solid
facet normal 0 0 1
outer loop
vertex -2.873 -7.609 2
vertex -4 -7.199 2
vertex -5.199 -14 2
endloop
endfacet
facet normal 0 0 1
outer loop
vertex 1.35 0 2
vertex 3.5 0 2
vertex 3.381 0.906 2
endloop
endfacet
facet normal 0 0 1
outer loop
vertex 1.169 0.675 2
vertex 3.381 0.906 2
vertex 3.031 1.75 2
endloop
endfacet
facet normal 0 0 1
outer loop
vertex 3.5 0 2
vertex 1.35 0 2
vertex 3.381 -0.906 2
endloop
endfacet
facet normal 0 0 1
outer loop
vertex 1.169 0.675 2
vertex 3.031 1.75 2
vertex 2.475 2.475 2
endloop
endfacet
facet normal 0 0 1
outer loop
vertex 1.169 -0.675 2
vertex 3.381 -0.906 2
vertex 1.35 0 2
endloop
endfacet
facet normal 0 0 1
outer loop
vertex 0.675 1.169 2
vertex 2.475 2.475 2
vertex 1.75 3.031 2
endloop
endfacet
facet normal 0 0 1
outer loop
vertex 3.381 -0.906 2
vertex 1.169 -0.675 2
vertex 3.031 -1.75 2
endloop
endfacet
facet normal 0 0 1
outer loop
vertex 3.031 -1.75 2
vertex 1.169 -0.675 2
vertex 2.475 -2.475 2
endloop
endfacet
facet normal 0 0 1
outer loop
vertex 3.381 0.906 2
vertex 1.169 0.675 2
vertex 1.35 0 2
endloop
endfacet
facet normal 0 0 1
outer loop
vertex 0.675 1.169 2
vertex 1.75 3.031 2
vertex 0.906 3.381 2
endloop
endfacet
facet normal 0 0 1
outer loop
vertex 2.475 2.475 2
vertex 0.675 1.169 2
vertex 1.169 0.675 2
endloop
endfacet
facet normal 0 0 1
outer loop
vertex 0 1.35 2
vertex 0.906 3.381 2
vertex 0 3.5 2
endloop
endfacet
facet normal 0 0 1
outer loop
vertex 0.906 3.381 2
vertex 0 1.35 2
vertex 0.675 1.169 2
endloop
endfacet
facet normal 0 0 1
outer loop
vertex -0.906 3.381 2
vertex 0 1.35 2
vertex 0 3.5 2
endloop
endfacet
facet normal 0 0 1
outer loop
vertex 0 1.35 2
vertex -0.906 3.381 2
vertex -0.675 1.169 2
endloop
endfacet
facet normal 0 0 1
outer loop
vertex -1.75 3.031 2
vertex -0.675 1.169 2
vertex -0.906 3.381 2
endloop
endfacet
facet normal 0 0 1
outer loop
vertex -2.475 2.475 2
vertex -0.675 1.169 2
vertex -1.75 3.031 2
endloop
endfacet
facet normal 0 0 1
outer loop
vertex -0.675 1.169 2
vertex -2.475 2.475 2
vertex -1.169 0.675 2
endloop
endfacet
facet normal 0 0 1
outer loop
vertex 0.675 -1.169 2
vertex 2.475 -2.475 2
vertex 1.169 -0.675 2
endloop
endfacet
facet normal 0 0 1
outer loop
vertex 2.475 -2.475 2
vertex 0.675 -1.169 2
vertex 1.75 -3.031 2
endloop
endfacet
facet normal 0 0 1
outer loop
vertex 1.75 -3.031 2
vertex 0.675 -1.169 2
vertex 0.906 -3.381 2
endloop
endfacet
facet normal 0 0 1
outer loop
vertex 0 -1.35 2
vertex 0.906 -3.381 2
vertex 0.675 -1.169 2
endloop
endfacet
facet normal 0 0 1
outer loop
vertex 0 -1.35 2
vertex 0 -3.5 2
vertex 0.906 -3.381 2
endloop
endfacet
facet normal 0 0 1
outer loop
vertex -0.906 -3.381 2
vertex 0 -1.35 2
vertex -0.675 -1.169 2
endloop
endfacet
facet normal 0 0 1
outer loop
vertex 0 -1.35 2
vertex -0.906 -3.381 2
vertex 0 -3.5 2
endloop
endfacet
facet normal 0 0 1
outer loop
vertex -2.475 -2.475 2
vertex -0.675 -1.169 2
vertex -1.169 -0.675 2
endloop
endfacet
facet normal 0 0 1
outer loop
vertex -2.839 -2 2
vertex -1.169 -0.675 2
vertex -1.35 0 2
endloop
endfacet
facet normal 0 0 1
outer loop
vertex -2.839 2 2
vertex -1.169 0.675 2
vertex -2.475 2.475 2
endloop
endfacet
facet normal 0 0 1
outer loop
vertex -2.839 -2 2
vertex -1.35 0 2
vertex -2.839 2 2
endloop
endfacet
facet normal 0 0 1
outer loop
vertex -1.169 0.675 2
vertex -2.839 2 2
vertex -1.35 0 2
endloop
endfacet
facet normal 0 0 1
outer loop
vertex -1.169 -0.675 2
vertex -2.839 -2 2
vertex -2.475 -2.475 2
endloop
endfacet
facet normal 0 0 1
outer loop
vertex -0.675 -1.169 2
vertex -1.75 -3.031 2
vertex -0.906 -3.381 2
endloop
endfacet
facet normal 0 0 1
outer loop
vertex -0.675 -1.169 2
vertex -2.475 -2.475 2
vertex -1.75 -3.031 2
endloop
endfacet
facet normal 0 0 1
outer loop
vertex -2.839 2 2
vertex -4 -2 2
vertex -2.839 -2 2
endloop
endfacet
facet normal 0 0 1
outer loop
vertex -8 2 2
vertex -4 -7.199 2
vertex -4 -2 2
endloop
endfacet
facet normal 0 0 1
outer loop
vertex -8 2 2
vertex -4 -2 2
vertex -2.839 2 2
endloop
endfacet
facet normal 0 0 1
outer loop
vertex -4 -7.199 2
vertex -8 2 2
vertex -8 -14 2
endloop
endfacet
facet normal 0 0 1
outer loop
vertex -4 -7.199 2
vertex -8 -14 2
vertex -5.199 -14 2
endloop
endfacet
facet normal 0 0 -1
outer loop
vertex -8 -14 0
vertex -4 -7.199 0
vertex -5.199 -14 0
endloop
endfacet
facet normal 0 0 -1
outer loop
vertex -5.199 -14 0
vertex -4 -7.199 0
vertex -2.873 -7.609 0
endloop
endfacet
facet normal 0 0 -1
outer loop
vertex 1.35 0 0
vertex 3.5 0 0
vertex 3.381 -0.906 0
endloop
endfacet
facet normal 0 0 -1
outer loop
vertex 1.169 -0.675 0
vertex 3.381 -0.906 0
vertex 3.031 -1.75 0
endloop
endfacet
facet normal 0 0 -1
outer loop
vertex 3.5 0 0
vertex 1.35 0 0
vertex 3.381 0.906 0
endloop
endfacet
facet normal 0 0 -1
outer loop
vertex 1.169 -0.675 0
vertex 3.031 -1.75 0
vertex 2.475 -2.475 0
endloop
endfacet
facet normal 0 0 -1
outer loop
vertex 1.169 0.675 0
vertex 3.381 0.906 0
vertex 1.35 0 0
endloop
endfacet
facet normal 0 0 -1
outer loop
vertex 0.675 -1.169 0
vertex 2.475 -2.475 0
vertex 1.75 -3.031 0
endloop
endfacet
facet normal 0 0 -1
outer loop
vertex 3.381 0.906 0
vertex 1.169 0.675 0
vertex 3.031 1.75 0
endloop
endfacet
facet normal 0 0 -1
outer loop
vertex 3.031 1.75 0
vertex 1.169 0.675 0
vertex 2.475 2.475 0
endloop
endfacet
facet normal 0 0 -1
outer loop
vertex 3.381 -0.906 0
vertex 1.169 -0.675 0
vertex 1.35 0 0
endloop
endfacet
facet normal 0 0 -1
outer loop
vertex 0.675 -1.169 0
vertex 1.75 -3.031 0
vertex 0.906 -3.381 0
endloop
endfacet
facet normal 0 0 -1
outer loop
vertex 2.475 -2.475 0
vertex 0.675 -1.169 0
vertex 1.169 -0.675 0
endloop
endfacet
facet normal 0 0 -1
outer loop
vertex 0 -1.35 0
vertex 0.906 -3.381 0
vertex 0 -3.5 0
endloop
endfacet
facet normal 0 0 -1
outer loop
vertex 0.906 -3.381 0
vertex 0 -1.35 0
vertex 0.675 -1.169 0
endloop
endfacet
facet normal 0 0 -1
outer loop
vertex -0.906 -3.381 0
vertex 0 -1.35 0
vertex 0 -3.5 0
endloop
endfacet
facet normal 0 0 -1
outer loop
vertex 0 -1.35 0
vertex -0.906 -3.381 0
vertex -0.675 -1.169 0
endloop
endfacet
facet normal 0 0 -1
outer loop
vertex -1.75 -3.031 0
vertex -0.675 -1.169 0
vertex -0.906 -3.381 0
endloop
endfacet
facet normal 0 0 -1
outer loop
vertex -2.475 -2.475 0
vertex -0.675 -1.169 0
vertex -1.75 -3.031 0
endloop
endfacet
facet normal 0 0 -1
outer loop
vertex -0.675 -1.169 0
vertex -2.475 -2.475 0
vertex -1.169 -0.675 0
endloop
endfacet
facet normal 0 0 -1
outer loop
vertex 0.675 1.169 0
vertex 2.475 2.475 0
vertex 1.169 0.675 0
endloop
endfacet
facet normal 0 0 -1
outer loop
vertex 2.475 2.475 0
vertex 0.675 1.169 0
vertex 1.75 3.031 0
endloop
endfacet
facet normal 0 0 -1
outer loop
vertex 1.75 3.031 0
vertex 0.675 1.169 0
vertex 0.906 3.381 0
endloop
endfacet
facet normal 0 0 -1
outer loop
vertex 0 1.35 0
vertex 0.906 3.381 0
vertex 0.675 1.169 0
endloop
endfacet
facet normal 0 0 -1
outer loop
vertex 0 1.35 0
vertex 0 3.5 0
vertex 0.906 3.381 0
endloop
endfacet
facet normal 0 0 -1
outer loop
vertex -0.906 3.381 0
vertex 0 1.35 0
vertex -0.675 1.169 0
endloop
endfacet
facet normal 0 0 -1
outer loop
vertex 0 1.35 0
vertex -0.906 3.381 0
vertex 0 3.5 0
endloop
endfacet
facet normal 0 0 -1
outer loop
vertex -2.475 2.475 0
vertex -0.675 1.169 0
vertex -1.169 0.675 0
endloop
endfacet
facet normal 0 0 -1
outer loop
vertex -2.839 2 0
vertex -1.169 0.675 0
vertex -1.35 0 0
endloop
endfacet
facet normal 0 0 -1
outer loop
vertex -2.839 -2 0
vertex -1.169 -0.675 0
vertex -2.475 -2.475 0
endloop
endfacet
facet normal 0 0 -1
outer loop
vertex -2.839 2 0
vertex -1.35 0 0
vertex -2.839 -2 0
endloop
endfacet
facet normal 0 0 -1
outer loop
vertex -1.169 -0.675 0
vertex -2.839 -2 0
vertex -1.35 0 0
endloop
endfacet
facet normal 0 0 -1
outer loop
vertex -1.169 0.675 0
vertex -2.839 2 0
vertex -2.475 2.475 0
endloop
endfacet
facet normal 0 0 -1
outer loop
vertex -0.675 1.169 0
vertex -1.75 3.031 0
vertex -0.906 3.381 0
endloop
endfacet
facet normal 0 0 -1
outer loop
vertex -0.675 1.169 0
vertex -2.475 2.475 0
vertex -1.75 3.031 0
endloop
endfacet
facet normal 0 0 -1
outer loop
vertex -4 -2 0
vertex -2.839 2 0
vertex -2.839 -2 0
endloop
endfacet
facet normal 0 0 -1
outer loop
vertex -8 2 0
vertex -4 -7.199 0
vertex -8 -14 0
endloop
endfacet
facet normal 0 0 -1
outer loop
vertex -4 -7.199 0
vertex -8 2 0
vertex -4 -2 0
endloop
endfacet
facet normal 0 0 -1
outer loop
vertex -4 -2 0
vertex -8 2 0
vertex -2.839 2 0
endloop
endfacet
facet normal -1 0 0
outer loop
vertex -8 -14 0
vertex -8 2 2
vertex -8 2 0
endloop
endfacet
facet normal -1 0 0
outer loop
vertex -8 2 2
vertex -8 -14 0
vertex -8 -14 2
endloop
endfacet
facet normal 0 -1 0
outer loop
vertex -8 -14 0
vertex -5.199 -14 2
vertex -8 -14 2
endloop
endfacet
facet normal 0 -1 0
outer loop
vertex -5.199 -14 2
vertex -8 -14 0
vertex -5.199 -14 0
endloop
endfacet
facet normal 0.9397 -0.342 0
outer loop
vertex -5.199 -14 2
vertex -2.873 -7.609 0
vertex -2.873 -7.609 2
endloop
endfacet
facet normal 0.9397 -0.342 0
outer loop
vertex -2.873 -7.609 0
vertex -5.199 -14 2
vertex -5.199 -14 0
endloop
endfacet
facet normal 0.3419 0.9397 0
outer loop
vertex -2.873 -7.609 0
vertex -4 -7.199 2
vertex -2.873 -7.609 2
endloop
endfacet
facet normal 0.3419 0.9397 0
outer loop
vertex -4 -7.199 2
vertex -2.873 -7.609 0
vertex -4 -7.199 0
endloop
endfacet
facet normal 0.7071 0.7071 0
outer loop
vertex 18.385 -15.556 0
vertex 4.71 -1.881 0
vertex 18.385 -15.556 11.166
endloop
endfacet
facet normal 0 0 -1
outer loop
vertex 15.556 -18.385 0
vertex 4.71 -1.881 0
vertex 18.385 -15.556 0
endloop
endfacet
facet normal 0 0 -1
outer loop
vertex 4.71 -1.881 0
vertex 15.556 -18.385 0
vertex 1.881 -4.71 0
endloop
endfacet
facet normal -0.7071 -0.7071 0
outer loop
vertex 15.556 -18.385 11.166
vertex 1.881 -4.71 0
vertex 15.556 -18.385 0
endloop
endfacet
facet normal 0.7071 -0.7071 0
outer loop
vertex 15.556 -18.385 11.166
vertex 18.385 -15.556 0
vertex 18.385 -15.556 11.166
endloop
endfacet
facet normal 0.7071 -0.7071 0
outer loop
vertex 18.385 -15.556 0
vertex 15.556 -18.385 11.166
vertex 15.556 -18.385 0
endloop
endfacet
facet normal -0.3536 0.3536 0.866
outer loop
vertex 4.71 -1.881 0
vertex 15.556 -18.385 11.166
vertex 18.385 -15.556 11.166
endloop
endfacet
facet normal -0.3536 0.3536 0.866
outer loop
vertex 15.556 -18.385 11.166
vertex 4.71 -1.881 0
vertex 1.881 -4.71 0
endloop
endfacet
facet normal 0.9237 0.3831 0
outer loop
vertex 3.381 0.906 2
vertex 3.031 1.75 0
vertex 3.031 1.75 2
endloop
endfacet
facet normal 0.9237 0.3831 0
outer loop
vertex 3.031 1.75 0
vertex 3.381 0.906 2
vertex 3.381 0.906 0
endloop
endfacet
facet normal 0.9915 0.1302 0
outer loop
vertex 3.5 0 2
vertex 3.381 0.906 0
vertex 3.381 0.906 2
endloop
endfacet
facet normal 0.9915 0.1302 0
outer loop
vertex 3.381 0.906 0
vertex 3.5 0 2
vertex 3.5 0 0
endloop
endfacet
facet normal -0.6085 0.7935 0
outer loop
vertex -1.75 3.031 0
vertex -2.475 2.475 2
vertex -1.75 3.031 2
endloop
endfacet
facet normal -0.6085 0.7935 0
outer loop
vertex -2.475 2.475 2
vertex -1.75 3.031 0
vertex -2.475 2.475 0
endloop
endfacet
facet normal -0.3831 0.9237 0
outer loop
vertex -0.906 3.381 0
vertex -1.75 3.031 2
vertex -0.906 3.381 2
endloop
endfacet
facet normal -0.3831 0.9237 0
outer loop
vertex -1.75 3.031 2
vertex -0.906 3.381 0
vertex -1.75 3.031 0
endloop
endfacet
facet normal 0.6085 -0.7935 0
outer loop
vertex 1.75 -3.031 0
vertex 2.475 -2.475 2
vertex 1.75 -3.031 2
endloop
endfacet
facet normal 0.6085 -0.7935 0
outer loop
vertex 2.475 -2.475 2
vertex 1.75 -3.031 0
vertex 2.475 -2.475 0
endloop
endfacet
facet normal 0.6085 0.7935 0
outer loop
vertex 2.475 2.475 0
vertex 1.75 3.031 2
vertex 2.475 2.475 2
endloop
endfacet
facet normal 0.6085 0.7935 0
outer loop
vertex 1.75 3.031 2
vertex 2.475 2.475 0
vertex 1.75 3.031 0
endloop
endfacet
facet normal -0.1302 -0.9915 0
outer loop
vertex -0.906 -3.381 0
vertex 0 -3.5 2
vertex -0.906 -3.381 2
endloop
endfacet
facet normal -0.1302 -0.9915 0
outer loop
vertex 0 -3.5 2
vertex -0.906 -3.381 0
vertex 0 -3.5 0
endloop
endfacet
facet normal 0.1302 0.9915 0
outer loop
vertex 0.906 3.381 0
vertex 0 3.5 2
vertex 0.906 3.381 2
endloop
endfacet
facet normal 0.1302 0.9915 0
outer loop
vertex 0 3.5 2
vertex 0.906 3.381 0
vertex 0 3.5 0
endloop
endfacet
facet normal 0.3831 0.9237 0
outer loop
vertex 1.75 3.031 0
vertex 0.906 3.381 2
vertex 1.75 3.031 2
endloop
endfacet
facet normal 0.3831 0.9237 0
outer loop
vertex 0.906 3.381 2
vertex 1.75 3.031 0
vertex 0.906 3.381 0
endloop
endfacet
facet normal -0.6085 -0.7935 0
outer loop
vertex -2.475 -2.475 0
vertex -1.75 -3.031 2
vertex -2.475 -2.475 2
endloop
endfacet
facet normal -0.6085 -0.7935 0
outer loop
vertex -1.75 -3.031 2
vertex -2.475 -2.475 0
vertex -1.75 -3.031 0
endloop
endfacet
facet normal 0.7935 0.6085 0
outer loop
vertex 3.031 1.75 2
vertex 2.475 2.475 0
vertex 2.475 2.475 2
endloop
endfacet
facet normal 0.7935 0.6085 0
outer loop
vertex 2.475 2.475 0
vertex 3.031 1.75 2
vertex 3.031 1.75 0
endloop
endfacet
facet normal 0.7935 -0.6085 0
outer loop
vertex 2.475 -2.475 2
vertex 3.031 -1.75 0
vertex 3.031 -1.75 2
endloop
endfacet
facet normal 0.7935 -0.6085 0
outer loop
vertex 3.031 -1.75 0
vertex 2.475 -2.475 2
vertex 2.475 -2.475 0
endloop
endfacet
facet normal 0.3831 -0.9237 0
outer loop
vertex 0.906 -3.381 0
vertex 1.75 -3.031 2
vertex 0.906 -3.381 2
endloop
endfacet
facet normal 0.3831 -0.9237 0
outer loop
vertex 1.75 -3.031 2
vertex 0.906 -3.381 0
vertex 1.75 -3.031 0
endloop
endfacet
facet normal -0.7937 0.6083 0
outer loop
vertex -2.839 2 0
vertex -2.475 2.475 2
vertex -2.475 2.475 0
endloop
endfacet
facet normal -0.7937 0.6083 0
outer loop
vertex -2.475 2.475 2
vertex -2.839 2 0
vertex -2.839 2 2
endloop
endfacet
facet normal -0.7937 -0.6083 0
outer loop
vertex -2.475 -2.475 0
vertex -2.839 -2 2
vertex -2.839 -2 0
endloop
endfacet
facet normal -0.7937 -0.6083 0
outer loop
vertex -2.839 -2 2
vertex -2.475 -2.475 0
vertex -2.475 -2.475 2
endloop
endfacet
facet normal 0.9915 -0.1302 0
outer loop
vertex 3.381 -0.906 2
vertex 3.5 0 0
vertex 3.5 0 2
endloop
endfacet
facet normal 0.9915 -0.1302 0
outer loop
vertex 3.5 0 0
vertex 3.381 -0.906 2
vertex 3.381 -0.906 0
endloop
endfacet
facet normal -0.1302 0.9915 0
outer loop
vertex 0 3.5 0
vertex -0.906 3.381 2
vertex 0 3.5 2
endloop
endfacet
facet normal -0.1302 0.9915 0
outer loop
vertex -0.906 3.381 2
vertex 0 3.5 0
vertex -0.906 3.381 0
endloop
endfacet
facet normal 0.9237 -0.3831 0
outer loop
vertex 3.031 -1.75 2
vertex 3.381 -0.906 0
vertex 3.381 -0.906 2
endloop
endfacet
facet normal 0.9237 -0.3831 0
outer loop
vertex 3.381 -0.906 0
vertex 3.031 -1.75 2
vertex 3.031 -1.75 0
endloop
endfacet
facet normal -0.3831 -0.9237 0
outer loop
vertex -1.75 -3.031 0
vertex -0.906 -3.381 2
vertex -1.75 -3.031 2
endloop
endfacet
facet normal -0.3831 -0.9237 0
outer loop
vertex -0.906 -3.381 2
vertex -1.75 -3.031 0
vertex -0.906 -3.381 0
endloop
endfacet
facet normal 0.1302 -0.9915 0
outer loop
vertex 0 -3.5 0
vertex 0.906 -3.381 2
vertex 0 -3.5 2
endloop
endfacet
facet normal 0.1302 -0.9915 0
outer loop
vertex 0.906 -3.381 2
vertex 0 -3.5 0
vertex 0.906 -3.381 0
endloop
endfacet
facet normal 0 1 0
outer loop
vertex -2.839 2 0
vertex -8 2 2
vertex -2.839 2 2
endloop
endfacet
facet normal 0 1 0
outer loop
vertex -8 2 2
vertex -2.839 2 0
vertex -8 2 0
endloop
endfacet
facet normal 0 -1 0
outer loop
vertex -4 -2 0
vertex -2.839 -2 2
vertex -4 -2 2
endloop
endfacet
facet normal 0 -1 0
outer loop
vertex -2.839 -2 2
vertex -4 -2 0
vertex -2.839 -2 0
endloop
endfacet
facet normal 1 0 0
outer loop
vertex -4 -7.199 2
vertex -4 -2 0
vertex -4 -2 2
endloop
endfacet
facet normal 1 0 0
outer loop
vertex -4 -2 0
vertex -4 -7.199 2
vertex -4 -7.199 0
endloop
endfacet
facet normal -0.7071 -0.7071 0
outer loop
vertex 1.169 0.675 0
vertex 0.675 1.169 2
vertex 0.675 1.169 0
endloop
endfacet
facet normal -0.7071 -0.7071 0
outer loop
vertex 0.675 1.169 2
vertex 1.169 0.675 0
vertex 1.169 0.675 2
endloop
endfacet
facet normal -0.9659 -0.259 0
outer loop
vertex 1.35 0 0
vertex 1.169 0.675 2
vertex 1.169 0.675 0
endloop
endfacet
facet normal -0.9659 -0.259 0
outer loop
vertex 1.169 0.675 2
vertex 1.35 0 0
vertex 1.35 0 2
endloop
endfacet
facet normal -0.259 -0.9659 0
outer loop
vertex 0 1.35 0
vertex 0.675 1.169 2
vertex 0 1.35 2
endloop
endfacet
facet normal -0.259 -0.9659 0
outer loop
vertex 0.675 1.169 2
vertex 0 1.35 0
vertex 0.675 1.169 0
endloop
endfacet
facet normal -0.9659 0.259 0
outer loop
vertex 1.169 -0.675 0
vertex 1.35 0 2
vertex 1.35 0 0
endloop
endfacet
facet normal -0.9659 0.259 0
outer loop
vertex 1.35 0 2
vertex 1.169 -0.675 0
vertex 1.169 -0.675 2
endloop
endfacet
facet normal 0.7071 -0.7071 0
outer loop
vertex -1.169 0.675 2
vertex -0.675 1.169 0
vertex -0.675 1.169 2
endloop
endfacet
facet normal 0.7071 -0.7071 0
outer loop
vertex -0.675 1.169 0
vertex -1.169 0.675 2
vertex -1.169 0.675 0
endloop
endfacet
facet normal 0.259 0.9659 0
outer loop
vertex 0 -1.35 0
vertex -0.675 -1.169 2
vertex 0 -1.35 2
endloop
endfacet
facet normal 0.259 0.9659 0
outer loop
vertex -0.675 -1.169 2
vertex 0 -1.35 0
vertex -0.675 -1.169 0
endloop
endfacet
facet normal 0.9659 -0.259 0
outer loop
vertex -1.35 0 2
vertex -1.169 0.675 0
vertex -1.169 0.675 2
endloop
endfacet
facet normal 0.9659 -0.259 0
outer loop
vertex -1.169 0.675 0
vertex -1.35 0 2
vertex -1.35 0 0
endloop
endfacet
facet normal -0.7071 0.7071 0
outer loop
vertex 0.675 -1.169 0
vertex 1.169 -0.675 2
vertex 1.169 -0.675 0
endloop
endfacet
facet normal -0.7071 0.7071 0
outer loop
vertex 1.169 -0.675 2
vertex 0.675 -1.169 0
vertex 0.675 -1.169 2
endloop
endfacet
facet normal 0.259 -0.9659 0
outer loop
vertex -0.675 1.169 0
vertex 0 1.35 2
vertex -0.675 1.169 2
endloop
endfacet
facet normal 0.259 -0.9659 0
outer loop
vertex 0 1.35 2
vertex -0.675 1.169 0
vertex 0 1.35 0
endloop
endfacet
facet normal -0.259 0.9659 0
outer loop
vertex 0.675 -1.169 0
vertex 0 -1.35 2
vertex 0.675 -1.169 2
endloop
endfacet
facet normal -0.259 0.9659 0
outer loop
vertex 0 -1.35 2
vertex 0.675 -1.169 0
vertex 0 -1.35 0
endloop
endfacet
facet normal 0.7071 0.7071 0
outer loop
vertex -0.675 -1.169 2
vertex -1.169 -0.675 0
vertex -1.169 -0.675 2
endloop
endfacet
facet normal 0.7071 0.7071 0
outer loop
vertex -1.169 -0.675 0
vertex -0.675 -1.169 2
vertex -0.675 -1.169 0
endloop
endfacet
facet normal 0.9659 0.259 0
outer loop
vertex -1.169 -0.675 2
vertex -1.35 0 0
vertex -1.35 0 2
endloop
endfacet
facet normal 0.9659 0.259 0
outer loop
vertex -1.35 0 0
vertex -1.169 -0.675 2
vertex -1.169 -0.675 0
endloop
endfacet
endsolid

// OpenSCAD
// file: configuration.scad
// Increase this if your slicer or printer make holes too tight.
extra_radius = 0.1;

// OD = outside diameter, corner to corner.
m3_nut_od = 6.1;
m3_nut_radius = m3_nut_od/2 + 0.2 + extra_radius;

// Major diameter of metric 3mm thread.
m3_major = 2.85;
m3_radius = m3_major/2 + extra_radius;
m3_wide_radius = m3_major/2 + extra_radius + 0.2;

// NEMA17 stepper motors.
motor_shaft_diameter = 5;
motor_shaft_radius = motor_shaft_diameter/2 + extra_radius;

// Frame brackets. M3x8mm screws work best with 3.6 mm brackets.
thickness = 3.6;

// OpenBeam or Misumi. Currently only 15x15 mm, but there is a plan
// to make models more parametric and allow 20x20 mm in the future.
extrusion = 15;
// main file
include <configuration.scad>;

hook_x = -4;
hook_y = -10;
thickness = 2;

module trigger() {
  difference() {
    union() {
      cylinder(r=3.5, h=thickness, center=true, $fn=24);
      translate([hook_x+1, 0, 0])
        cube([10, 4, thickness], center=true);
      translate([hook_x, hook_y, 0]) intersection() {
        cube([8, 8, thickness], center=true);
        translate([-4, 0, 0]) rotate([0, 0, -20])
          cube([8, 8, thickness], center=true);
      }
      translate([hook_x-2, -4, 0])
        cube([4, 8, thickness], center=true);
      rotate([0, 0, 45]) intersection() {
        translate([0, -12, 5])
          cube([4, 24, 12], center=true);
        translate([0, -16, -6]) rotate([-30, 0, 0])
          cube([4, 60, 20], center=true);
      }
    }
    cylinder(r=2.5/2+extra_radius, h=16, center=true, $fn=12);
  }
}

translate([0, 0, thickness/2]) trigger();
